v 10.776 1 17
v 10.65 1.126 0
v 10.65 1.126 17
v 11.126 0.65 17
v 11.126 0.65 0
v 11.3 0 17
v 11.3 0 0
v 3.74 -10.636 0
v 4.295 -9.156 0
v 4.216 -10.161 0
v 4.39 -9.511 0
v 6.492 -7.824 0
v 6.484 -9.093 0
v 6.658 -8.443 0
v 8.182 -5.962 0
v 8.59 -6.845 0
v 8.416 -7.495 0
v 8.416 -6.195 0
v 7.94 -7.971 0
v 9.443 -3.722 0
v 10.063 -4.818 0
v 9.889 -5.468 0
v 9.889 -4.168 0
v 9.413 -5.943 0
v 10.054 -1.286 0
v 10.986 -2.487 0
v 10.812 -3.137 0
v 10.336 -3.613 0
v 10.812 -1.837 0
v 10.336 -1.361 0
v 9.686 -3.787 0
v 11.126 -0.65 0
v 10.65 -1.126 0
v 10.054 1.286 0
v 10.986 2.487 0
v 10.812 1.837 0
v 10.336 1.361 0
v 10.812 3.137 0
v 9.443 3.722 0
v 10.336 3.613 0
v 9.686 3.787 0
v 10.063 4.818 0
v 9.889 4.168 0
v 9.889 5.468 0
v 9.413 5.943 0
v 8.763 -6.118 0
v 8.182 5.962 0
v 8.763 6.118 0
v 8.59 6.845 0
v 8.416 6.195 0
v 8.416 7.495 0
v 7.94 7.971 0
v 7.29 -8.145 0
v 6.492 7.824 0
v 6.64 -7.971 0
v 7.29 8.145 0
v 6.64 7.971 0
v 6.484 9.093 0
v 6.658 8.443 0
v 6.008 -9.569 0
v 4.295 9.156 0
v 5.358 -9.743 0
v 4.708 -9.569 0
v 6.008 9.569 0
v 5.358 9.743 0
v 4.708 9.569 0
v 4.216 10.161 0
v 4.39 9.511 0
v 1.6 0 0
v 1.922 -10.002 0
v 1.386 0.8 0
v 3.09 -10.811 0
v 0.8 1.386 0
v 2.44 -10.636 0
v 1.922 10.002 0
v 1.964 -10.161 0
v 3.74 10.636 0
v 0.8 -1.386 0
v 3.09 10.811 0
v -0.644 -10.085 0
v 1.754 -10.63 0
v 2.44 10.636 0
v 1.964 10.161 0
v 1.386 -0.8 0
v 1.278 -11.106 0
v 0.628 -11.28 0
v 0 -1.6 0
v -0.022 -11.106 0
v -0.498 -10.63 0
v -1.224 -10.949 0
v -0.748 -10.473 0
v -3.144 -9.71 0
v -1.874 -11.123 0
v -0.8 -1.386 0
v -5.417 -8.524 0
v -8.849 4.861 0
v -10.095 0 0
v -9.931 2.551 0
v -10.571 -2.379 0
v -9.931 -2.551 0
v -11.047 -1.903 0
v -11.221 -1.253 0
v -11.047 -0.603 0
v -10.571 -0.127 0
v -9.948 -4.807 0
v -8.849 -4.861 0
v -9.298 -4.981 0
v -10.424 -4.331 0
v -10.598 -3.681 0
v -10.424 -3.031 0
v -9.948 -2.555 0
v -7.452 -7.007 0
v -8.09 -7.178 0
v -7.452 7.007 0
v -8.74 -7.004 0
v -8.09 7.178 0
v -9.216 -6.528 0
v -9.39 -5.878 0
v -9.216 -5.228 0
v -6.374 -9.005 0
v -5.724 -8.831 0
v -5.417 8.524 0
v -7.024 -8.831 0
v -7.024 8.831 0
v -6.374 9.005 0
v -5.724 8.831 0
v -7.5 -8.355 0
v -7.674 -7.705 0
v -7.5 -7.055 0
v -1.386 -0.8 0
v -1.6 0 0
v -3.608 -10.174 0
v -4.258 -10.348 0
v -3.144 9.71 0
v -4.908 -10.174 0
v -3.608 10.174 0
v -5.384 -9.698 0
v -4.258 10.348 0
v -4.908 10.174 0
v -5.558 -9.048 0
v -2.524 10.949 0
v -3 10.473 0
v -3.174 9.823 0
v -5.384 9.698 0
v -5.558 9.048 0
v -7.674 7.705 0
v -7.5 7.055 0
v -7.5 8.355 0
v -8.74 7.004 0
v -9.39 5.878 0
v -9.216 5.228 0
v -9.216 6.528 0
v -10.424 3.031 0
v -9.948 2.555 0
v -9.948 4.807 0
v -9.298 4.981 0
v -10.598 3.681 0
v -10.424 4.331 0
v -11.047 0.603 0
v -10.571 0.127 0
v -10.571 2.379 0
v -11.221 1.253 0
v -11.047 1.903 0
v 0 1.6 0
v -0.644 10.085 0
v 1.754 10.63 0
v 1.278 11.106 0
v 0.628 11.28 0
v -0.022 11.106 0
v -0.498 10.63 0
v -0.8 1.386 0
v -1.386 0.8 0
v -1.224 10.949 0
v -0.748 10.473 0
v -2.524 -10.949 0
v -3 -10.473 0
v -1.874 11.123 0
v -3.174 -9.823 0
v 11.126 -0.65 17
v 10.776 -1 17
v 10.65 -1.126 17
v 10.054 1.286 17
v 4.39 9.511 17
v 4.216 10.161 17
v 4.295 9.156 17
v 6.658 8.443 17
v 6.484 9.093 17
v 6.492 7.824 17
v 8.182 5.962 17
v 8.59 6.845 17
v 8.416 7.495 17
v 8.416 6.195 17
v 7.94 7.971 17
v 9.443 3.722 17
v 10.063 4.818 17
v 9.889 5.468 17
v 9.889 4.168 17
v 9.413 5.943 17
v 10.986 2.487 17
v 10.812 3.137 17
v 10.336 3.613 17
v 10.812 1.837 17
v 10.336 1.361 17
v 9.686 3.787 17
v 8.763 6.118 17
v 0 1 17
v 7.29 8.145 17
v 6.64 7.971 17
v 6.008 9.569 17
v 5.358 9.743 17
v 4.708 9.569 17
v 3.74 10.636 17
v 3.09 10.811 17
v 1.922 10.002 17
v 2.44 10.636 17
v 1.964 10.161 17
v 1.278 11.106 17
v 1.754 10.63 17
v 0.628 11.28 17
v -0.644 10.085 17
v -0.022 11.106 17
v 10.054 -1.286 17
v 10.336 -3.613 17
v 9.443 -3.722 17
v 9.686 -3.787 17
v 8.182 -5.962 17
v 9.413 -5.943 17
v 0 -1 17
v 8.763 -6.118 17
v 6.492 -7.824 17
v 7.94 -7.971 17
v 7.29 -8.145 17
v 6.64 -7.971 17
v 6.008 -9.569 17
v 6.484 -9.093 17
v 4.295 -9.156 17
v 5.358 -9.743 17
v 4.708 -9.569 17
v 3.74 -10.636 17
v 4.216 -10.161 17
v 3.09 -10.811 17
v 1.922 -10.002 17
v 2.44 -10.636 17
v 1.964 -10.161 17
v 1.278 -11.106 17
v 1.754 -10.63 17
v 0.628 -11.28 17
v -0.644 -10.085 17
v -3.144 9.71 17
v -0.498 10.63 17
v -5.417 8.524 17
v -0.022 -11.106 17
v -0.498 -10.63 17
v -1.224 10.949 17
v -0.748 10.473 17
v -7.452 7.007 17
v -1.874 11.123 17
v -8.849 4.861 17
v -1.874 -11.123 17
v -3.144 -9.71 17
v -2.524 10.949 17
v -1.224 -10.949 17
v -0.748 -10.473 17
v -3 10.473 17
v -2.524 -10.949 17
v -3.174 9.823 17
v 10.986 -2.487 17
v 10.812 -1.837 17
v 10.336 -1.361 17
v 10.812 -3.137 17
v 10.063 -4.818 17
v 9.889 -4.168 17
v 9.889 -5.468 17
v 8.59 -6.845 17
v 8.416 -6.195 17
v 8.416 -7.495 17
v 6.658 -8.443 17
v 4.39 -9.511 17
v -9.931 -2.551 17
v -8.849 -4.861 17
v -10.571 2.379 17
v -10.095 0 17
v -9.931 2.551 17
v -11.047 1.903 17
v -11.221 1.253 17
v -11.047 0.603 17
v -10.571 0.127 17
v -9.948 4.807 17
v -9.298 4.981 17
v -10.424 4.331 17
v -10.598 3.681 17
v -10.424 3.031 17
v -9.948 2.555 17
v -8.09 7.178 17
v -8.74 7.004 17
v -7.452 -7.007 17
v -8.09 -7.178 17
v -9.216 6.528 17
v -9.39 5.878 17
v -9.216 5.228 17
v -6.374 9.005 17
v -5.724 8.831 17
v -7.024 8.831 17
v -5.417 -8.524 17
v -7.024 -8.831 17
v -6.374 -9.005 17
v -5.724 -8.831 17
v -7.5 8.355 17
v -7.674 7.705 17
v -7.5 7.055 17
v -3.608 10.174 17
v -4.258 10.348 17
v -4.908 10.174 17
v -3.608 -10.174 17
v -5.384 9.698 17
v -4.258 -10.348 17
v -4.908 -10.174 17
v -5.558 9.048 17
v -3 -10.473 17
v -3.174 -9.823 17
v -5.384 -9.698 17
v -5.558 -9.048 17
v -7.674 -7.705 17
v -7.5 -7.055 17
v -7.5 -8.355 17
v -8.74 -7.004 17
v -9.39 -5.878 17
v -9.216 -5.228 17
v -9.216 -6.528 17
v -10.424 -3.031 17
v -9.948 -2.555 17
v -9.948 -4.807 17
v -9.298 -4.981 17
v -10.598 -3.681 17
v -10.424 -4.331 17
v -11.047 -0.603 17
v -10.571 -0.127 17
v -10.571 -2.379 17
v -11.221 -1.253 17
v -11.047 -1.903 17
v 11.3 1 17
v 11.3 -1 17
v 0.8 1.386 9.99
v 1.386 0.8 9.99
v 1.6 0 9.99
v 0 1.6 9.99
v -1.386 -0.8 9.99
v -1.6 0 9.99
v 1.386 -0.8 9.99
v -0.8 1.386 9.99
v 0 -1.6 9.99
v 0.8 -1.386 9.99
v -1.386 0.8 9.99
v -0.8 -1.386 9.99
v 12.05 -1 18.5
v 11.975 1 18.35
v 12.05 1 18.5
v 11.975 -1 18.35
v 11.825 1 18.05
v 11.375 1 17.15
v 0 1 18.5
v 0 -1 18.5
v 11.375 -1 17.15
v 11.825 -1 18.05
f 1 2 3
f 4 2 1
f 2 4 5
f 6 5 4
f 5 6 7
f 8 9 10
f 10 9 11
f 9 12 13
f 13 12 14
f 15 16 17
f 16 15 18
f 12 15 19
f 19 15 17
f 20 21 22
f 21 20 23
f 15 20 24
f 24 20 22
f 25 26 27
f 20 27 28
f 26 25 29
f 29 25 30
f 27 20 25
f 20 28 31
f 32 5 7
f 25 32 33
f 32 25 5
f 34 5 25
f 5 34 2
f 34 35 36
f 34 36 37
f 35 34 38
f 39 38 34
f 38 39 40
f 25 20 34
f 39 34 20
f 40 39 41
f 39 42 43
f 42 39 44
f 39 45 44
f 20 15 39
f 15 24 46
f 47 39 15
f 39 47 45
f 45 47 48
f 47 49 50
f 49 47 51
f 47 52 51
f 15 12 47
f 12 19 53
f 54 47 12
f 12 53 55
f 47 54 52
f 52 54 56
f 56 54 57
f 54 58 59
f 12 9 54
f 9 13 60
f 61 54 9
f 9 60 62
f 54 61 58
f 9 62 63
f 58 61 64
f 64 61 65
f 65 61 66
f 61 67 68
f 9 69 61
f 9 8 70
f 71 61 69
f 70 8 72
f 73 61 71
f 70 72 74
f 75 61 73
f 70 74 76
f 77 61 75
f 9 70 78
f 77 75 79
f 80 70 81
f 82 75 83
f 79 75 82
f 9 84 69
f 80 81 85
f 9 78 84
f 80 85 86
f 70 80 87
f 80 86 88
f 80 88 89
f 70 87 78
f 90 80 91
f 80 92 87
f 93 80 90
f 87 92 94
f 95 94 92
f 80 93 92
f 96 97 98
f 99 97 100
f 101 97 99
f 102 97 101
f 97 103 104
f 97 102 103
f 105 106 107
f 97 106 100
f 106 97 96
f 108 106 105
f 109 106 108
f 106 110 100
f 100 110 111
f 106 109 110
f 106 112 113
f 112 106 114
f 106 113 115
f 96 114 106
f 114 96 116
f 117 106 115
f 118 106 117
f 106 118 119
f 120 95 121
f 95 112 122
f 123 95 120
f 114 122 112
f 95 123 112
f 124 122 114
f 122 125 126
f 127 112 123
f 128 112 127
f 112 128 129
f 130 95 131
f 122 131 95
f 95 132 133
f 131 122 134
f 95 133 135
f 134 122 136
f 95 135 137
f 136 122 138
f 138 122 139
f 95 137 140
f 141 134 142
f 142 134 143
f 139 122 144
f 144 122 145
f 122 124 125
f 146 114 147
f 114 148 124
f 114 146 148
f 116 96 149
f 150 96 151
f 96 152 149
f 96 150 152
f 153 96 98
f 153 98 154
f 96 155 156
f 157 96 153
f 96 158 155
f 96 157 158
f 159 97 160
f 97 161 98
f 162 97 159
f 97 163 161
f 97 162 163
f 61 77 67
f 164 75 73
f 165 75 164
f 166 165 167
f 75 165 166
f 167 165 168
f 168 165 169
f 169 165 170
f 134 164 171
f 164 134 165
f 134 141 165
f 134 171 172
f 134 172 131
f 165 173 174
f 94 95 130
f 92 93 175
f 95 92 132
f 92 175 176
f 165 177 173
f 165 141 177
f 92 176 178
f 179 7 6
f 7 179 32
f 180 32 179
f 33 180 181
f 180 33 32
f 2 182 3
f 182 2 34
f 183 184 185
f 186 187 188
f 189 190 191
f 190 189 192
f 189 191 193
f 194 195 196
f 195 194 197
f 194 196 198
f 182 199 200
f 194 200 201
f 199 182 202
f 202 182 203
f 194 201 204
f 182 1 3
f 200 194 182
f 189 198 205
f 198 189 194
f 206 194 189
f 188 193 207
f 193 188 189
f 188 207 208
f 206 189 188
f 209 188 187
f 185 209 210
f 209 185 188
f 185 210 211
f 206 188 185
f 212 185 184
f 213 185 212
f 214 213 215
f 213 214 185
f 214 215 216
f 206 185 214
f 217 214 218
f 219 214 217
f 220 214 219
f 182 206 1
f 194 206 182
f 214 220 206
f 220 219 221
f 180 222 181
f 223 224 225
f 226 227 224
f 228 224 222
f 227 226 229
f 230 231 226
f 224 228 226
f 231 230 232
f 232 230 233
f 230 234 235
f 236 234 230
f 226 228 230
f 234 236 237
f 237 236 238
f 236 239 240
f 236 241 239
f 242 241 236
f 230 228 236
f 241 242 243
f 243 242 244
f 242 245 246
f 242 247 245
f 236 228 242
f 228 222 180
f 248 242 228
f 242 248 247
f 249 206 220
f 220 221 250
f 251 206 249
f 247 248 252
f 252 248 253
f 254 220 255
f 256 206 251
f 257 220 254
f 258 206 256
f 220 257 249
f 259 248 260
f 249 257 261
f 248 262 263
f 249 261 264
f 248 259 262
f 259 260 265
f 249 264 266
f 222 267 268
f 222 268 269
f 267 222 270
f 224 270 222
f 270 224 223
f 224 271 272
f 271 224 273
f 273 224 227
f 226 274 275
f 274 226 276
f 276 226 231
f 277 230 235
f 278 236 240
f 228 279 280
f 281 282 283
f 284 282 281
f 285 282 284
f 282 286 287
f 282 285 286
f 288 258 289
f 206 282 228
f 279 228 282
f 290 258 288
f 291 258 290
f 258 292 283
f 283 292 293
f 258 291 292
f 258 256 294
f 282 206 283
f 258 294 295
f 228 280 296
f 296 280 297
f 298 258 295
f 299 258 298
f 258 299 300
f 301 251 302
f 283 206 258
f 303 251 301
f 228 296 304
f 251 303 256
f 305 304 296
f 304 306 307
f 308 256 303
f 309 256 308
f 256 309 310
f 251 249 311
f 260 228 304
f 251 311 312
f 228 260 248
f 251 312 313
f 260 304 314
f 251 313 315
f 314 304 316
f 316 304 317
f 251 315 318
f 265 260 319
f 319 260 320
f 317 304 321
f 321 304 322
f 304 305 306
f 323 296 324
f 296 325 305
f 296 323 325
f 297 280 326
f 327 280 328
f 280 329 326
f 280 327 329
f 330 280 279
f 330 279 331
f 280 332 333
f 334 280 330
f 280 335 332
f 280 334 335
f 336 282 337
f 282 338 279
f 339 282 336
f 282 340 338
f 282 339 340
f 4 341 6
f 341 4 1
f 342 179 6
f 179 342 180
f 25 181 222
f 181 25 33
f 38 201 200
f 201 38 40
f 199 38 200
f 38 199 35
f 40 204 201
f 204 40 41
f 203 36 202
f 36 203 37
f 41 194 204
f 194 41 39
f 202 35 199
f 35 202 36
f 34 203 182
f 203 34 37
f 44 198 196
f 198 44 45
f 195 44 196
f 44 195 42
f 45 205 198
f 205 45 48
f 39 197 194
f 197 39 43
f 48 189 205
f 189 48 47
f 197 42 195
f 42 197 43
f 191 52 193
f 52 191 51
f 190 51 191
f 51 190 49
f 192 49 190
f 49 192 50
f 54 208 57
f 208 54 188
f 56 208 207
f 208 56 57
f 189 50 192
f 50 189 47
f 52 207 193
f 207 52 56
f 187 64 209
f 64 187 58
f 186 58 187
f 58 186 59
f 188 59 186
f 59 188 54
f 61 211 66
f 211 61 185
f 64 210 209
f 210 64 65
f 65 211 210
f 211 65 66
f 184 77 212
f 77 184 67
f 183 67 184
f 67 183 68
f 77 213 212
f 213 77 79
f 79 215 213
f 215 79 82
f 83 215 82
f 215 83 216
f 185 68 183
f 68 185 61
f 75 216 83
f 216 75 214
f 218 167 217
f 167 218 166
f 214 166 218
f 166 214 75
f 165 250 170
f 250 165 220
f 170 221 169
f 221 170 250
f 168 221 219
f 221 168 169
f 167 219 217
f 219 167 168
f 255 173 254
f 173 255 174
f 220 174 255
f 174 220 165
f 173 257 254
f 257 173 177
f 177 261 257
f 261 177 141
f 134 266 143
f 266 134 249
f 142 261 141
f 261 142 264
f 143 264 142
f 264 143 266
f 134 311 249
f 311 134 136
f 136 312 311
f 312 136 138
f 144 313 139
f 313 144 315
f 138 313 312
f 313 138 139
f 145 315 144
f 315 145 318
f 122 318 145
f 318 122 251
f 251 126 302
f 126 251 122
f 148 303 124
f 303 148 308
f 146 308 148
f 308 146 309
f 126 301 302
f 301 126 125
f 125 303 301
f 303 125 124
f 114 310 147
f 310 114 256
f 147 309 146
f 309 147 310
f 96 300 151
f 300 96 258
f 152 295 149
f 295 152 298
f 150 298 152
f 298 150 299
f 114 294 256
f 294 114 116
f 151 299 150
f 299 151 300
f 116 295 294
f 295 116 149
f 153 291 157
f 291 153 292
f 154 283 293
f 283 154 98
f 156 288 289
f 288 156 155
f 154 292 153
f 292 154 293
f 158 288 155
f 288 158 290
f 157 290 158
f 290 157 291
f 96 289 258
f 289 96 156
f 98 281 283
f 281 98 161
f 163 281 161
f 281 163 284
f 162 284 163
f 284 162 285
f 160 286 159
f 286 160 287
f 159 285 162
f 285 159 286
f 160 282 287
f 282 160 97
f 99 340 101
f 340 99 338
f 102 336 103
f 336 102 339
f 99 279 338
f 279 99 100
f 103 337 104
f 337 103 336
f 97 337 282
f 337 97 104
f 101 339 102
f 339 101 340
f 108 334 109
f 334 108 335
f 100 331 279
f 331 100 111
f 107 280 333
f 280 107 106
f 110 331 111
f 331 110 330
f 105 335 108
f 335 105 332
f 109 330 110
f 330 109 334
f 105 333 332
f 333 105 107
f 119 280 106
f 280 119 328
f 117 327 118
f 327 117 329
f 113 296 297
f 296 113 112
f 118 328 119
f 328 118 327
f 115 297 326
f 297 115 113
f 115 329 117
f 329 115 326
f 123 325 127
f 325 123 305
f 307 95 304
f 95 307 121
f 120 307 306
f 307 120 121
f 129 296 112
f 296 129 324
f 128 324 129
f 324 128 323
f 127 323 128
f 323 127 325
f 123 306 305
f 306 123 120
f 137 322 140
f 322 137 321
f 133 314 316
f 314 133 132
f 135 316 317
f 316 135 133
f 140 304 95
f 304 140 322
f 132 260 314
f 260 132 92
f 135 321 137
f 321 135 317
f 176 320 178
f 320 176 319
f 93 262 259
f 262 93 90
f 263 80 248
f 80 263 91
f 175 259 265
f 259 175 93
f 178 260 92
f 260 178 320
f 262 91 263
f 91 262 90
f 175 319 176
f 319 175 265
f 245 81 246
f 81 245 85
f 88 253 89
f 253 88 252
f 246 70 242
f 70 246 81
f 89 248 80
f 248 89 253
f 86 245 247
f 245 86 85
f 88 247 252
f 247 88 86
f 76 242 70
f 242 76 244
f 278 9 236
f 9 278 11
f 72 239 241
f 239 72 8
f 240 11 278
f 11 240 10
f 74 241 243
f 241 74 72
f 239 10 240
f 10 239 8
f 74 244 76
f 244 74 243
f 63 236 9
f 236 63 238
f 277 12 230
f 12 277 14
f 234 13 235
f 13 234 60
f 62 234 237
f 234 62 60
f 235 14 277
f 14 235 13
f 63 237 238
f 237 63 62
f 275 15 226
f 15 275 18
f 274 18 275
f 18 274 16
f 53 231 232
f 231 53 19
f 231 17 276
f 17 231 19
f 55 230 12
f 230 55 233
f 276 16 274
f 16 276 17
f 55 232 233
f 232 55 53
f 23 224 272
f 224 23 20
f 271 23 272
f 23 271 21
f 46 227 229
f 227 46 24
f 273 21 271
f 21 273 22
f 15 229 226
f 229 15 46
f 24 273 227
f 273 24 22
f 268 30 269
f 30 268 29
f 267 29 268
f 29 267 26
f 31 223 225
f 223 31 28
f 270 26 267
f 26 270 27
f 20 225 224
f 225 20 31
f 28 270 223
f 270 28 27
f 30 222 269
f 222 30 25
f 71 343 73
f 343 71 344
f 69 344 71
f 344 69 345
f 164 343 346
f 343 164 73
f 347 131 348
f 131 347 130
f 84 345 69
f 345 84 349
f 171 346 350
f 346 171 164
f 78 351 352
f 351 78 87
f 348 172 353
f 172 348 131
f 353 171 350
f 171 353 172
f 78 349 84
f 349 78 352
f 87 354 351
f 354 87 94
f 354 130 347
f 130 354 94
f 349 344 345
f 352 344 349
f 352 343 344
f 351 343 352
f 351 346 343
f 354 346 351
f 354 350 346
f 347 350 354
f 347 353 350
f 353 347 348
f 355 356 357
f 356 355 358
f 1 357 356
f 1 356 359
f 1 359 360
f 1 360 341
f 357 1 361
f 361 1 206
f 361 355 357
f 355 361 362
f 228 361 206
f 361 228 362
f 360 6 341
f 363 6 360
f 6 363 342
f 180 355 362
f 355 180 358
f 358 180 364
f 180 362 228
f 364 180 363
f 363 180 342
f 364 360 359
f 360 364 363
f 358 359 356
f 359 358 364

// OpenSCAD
d = 20;
h = 17;
lineHeight = 1.5;
lineThickness = 2;
holeDiameter = 3.2;
holeHeight = 10;
stickoutRatio = 0.5;
knurl = 1.3;

module end_of_parameters_dummy() {}

// Licensed under MIT license or CC 3.0-by-nc-sa

//use <tubemesh.scad>;
// params = [sections,sectionCounts]

// written for tail-recursion
// _subtotals[i] = list[0] + ... + list[i-1]
function _subtotals(list,soFar=[]) =
        len(soFar) >= 1+len(list) ? soFar :
        _subtotals(list,
            let(n1=len(soFar))
            concat(soFar, n1>0 ? soFar[n1-1]+list[n1-1] : 0));

function _flatten(list) = [for (a=list) for(b=a) b];

function _reverseTriangle(t) = [t[2], t[1], t[0]];

// smallest angle in triangle
function _minAngle(p1,p2,p3) =
    let(a = p2-p1,
        b = p3-p1,
        c = p3-p2,
        v1 = a*b,
        v2 = -(c*a))
        v1 == 0 || v2 == 0 ? 0 :
        let( na = norm(a),
             a1 = acos(v1 / (na*norm(b))),
             a2 = acos(v2 / (na*norm(c))) )
        min(a1,a2,180-(a1+a2));

// triangulate square to maximize smallest angle
function _doSquare(points,i11,i21,i22,i12,optimize=true) =
    points[i11]==points[i12] ? [[i11,i21,i22]] :
    points[i21]==points[i22] ? [[i22,i12,i11]] :
    !optimize ? [[i11,i21,i22], [i22,i12,i11]] :
    let (m1 = min(_minAngle(points[i11],points[i21],points[i22]), _minAngle(points[i22],points[i12],points[i11])),
        m2 = min(_minAngle(points[i11],points[i21],points[i12]),
                _minAngle(points[i21],points[i22],points[i12])) )
        m2 <= m1 ? [[i11,i21,i22], [i22,i12,i11]] :
                  [[i11,i21,i12], [i21,i22,i12]];

/*
function _inTriangle(v1,t) = (v1==t[0] || v1==t[1] || v1==t[2]);

function _findTheDistinctVertex(t1,t2) =
    let(in = [for(i=[0:2]) _inTriangle(t1[i],t2)])
    ! in[0] && in[1] && in[2] ? 0 :
    ! in[1] && in[0] && in[2] ? 1 :
    ! in[2] && in[0] && in[1] ? 2 :
    undef;

// make vertex i come first
function _rotateTriangle(t,i) =
    [for (j=[0:2]) t[(j+i)%3]];

function _optimize2Triangles(points,t1,t2) =
    let(i1 = _findTheDistinctVertex(t1,t2))
    i1 == undef ? [t1,t2] :
    let(i2 = _findTheDistinctVertex(t2,t1))
    i2 == undef ? [t1,t2] :
    let(t1 = _rotateTriangle(t1,i1),
        t2 = _rotateTriangle(t2,i2))
    _doSquare(points,t1[1],t2[0],t2[1],t1[0],optimize=true);

// a greedy optimization for a strip of triangles most of which adjoin one another; written for tail-recursion
function _optimizeTriangles(points,triangles,position=0,optimize=true,iterations=4) =
        !optimize || position >= iterations*len(triangles) ? triangles :
            _optimizeTriangles(points,
                let(
                    n = len(triangles),
                    position1=position%n,
                    position2=(position+1)%n,
                    opt=_optimize2Triangles(points,triangles[position1],triangles[position2]))
                    [for (i=[0:len(triangles)-1])
                        i == position1 ? opt[0] :
                        i == position2 ? opt[1] :
                            triangles[i]],
                position=position+1);
*/

function _removeEmptyTriangles(points,triangles) =
    [for(t=triangles)
        if(true || points[t[0]] != points[t[1]] && points[t[1]] != points[t[2]] && points[t[2]] != points[t[0]]) t];

// n1 and n2 should be fairly small, so this doesn't need
// tail-recursion
// this assumes n1<=n2
function _tubeSegmentTriangles(points,index1,n1,index2,n2,i=0,soFar=[],optimize=true)
    = i>=n2 ? _removeEmptyTriangles(points,soFar) :
            let(i21=i,
                i22=(i+1)%n2,
                i11=floor((i21)*n1/n2+0.5)%n1,
                i12=floor((i22)*n1/n2+0.5)%n1,
                add = i11==i12 ? [[index1+i11,index2+i21,index2+i22]] :
                    _doSquare(points,index1+i11,index2+i21,index2+i22,index1+i12,optimize=optimize))
                _tubeSegmentTriangles(points,index1,n1,index2,n2,i=i+1,soFar=concat(soFar,add),optimize=optimize);

function _tubeSegmentFaces(points,index,n1,n2,optimize=true)
    = n1<n2 ? _tubeSegmentTriangles(points,index,n1,index+n1,n2,optimize=optimize) :
        [for (f=_tubeSegmentTriangles(points,index+n1,n2,index,n1,optimize=optimize)) _reverseTriangle(f)];

function _tubeMiddleFaces(points,counts,subtotals,optimize=true) = [ for (i=[1:len(counts)-1])
           for (face=_tubeSegmentFaces(points,subtotals[i-1],counts[i-1],counts[i],optimize=optimize)) face ];

function _endCaps(counts,subtotals,startCap=true,endCap=true) =
    let( n = len(counts),
         cap1 = counts[0]<=2 || !startCap ? undef : [for(i=[0:counts[0]-1]) i],
         cap2 = counts[n-1]<=2 || !endCap ? undef : [for(i=[counts[n-1]-1:-1:0]) subtotals[n-1]+i] )
       [for (c=[cap1,cap2]) if (c!=undef) c];

function _tubeFaces(sections,startCap=true,endCap=true,optimize=true) =
                let(
        counts = [for (s=sections) len(s)],
        points = _flatten(sections),
        subtotals = _subtotals(counts))
            concat(_tubeMiddleFaces(points,counts,subtotals,optimize=optimize),_endCaps(counts,subtotals,startCap=true,endCap=true));

function _removeDuplicates1(points,soFar=[[],[]]) =
        len(soFar[0]) >= len(points) ? soFar :
            _removeDuplicates1(points,
               let(
                mapSoFar=soFar[0],
                pointsSoFar=soFar[1],
                j=len(mapSoFar),
                k=search([points[j]], pointsSoFar)[0])
                k == []? [concat(mapSoFar,[len(pointsSoFar)]),
                            concat(pointsSoFar,[points[j]])] :
                           [concat(mapSoFar,[k]),pointsSoFar]);

function _removeDuplicates(points, faces) =
    let(fix=_removeDuplicates1(points),
        map=fix[0],
        newPoints=fix[1],
        newFaces=[for(f=faces) [for(v=f) map[v]]])
            [newPoints, newFaces];

function pointsAndFaces(sections,startCap=true,endCap=true,optimize=true) =
        let(
            points0=_flatten(sections),
            faces0=_tubeFaces(sections,startCap=startCap,endCap=endCap,optimize=optimize))
        _removeDuplicates(points0,faces0);

module tubeMesh(sections,startCap=true,endCap=true,optimize=true) {
    pAndF = pointsAndFaces(sections,startCap=startCap,endCap=endCap,optimize=optimize);
    polyhedron(points=pAndF[0],faces=pAndF[1]);
}

// increase number of points from len(section) to n
function _interpolateSection(section,n) =
        let(m=len(section))
        n == m ? section :
        n < m ? undef :
            [for(i=[0:m-1])
                let(cur=floor(i*n/m),
                    k=floor((i+1)*n/m)-cur,
                    i2=(i+1)%m)
                    for(j=[0:k-1])
                        let(t=j/k)
                            section[i]*(1-t)+section[i2]*t];

function ngonPoints(n=4,r=10,d=undef,rotate=0,z=undef) =
            let(r=d==undef?r:d/2)
            z==undef ?
            r*[for(i=[0:n-1]) let(angle=i*360/n+rotate) [cos(angle),sin(angle)]] :
            [for(i=[0:n-1]) let(angle=i*360/n+rotate) [r*cos(angle),r*sin(angle),z]];

function starPoints(n=10,r1=5,r2=10,rotate=0,z=undef) =
          z==undef ?
            [for(i=[0:2*n-1]) let(angle=i*180/n+rotate) (i%2?r1:r2) * [cos(angle),sin(angle)]] :
            [for(i=[0:2*n-1]) let(angle=i*180/n+rotate, r=i%2?r1:r2) [r*cos(angle),r*sin(angle),z]];

// warning: no guarantee of perfect convexity
module mySphere(r=10,d=undef) {
    GA = 2.39996322972865332 * 180 / PI;
    radius = d==undef ? r : d/2;
    pointsAround =
        $fn ? $fn :
        max(3, floor(0.5+360/$fa), floor(0.5+2*radius*PI/$fs));
    numSlices0 = (pointsAround + pointsAround % 2)/2;
    numSlices = numSlices0 + (numSlices0%2);
    sections = radius*[for(i=[0:numSlices])
                    i == 0 ? [[0,0,-1]] :
                    i == numSlices ? [[0,0,1]] :
                    let(
                        lat = (i-numSlices/2)/(numSlices/2)*90,
                        z1 = sin(lat),
                        r1 = cos(lat),
                        count = max(3,floor(0.5 + pointsAround * abs(r1))))
                        ngonPoints(count,r=r1,z=z1)];
    data = pointsAndFaces(sections,optimize=false);
    polyhedron(points=data[0], faces=data[1]);
}

module morphExtrude(section1,section2,height=undef,twist=0,numSlices=10,startCap=true,endCap=true,optimize=false) {
    n = max(len(section1),len(section2));

    section1interp = _interpolateSection(section1,n);
    section2interp = _interpolateSection(section2,n);
    sections = height == undef ?
                      [for(i=[0:numSlices])
                        let(t=i/numSlices)
                        (1-t)*section1interp+t*section2interp] :
                      [for(i=[0:numSlices])
                        let(t=i/numSlices,
                            theta = t*twist,
                            section=(1-t)*section1interp+t*section2interp)
                        [for(p=section) [p[0]*cos(theta)-p[1]*sin(theta),p[0]*sin(theta)+p[1]*cos(theta),height*t]]];

    tubeMesh(sections,startCap=startCap,endCap=endCap,optimize=false);
}

module cone(r=10,d=undef,height=10) {
    radius = d==undef ? r : d/2;
    pointsAround =
        $fn ? $fn :
        max(3, floor(0.5+360/$fa), floor(0.5+2*radius*PI/$fs));
    morphExtrude(ngonPoints(n=pointsAround,r=radius), [[0,0]], height=height,optimize=false);
}

module prism(base=[[0,0,0],[1,0,0],[0,1,0]], vertical=[0,0,1]) {
    morphExtrude(base,[for(v=base) v+vertical],numSlices=1);
}



module knurledCylinder(h=10,r1=5,r2=1.5) {
    n = ceil(2 * PI * r1 / (2 * r2));
    cylinder(h=h,r=r1,$fn=n);
    for (i=[0:n-1]) {
        x = r1*cos(360./n*i);
        y = r1*sin(360./n*i);
        translate([x,y,0]) cylinder(h=h,r=r2,$fn=12);
    }
}

render(convexity=3)
difference() {
knurledCylinder(h=h,r1=d/2,r2=knurl);
translate([0,0,-0.01]) cylinder(h=holeHeight,d=holeDiameter,$fn=12);
}

translate([0,0,h])
morphExtrude([[0,-lineThickness/2],[d/2+knurl,-lineThickness/2],[d/2+knurl,lineThickness/2],[0,lineThickness/2]],
    [[0,-lineThickness/2],[d/2+knurl+lineHeight*stickoutRatio,-lineThickness/2],[d/2+knurl+lineHeight*stickoutRatio,lineThickness/2],[0,lineThickness/2]],
    height=lineHeight);
